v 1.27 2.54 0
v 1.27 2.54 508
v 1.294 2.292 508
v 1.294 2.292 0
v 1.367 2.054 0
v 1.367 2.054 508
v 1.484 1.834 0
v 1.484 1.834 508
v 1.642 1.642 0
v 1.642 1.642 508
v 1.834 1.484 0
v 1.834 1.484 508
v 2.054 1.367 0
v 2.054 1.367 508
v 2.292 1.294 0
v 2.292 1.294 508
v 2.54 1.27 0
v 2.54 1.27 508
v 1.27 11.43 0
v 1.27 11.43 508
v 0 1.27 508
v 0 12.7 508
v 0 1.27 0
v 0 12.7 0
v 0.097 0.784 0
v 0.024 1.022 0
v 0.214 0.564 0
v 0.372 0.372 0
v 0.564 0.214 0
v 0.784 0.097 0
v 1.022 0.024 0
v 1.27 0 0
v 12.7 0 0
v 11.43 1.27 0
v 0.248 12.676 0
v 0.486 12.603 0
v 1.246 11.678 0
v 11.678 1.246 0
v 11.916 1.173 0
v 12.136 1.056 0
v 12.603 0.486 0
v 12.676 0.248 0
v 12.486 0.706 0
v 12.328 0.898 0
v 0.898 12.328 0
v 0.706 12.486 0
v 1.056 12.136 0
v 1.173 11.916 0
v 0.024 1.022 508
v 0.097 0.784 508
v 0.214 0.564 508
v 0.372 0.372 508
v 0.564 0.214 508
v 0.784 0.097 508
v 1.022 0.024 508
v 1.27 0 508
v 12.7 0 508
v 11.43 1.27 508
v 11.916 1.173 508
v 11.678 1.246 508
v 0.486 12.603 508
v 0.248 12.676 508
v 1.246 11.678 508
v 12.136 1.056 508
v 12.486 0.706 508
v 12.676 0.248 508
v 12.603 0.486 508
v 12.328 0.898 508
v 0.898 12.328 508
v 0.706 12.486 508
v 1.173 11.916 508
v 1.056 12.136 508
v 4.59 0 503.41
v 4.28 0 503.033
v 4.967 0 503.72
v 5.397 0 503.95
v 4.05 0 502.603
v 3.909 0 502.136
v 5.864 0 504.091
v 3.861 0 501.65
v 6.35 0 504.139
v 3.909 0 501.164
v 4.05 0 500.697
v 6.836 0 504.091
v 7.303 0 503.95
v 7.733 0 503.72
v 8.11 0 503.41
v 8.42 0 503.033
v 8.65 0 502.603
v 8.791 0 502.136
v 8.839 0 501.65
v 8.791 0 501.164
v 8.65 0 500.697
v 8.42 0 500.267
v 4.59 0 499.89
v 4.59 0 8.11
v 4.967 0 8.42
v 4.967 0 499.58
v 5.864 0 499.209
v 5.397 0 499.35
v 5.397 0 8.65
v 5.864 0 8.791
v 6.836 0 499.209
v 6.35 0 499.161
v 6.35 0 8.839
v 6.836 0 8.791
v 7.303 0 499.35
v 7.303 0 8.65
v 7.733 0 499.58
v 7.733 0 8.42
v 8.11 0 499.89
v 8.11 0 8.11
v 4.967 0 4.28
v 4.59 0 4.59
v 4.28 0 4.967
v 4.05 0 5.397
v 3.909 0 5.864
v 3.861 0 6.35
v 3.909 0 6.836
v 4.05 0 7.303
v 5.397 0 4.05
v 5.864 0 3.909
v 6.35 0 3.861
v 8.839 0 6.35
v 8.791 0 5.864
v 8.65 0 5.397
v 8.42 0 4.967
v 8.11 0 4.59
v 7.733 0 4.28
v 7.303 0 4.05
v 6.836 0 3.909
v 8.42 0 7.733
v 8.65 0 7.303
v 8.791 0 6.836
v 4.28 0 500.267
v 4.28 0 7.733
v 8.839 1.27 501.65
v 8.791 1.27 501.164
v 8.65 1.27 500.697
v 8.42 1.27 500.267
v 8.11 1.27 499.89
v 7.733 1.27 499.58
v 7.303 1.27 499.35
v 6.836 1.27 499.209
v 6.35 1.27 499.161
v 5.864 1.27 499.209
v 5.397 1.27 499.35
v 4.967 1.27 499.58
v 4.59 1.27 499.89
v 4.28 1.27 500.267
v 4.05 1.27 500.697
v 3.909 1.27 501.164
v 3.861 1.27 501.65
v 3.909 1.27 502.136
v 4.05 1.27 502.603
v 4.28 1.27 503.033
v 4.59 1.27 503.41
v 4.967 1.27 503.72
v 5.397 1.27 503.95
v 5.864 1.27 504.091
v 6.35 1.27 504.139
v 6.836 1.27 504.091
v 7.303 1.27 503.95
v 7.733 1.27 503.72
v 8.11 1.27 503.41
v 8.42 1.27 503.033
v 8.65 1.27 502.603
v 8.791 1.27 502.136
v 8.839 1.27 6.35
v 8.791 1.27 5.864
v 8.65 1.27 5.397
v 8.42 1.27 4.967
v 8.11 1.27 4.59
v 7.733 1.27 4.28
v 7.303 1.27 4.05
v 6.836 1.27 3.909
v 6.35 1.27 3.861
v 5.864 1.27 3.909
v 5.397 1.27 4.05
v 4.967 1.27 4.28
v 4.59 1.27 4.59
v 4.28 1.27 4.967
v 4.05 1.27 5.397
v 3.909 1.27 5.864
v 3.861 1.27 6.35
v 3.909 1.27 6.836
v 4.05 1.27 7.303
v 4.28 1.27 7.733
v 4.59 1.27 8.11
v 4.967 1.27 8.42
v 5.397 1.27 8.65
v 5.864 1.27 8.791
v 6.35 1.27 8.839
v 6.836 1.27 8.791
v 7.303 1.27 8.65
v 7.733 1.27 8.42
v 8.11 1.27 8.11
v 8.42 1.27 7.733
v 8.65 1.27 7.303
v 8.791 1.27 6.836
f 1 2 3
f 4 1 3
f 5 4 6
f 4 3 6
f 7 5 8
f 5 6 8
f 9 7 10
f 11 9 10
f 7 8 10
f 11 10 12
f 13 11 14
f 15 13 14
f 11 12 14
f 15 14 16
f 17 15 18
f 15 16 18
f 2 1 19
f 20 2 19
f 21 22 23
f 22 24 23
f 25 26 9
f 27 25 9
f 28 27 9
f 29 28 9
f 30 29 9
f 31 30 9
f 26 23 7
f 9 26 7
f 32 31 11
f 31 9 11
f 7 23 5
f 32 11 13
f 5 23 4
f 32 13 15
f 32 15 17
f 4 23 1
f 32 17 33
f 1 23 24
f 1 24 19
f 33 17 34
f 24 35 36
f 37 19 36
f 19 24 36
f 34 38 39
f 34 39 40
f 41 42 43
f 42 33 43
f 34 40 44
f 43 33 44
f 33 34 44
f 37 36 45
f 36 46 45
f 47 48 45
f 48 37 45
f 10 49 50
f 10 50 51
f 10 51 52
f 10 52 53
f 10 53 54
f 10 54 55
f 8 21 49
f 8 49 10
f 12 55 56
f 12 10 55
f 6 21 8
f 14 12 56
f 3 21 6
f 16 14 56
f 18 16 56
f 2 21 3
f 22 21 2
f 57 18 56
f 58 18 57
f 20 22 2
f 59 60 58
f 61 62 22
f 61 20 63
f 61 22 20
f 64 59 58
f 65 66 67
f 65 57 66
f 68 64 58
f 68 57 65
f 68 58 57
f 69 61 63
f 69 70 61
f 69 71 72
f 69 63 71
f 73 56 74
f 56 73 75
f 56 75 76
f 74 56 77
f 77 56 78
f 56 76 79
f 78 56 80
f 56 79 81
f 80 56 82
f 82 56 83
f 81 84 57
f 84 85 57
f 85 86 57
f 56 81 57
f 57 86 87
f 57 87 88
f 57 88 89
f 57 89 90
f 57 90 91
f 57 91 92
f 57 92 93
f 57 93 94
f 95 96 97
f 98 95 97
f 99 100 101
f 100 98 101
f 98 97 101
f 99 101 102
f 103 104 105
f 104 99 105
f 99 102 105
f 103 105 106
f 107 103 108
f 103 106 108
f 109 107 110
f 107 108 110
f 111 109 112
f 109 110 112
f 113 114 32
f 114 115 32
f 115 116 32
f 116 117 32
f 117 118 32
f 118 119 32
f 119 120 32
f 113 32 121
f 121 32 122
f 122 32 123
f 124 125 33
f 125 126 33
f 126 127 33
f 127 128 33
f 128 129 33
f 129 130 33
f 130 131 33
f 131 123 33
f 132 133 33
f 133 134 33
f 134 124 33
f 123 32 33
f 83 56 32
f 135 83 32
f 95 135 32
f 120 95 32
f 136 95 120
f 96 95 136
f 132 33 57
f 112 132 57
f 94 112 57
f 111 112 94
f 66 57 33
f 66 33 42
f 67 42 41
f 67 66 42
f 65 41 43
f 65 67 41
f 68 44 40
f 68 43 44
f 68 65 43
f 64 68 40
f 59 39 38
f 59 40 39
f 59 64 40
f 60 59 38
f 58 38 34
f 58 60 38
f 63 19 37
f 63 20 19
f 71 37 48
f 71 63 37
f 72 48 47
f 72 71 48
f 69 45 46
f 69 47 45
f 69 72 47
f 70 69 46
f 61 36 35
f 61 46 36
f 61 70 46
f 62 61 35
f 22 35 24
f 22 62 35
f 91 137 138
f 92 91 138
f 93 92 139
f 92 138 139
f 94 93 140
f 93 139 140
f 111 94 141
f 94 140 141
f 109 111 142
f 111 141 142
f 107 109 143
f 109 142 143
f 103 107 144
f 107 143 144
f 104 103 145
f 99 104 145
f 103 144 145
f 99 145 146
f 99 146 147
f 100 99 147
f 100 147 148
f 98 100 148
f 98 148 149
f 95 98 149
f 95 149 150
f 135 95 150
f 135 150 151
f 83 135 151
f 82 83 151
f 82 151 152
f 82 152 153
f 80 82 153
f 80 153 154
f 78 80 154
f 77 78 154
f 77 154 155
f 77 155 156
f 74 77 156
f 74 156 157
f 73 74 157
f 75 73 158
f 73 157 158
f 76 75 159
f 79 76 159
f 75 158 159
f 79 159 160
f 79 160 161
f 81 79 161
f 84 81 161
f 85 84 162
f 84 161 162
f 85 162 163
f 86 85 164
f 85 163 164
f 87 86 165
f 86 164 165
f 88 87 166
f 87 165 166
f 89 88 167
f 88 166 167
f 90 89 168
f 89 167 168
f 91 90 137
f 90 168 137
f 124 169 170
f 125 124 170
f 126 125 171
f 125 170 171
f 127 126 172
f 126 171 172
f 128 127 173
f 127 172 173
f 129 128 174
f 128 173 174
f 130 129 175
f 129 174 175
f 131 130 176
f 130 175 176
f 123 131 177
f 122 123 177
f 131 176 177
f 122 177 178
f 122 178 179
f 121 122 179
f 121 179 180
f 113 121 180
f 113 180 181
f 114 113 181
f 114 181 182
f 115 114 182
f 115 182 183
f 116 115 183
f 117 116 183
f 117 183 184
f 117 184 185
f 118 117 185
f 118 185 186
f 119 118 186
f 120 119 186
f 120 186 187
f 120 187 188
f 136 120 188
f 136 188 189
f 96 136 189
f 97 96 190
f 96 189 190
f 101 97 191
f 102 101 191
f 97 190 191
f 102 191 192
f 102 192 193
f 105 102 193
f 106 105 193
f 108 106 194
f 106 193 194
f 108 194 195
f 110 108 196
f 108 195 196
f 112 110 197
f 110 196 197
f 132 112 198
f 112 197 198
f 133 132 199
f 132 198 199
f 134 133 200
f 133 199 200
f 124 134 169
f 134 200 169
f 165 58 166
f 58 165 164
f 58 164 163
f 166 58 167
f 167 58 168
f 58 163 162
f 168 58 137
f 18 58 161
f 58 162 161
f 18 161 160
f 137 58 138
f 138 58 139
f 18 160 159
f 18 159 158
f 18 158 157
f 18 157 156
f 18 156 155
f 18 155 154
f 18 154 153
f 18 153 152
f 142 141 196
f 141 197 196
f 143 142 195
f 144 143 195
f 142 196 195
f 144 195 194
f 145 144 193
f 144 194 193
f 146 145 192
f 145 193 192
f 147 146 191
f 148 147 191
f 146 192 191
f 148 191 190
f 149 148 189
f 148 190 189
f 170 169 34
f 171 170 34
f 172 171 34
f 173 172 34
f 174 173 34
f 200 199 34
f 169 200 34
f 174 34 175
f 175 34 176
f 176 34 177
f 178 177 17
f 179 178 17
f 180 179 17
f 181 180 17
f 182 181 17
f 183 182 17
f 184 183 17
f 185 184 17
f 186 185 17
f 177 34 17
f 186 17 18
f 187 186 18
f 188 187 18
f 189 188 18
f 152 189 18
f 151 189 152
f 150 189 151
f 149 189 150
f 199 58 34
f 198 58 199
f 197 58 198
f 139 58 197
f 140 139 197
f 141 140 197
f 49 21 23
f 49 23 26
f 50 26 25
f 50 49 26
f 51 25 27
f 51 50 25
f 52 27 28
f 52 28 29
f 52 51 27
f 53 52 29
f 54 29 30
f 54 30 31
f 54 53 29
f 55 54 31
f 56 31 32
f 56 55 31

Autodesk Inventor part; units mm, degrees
ref_plane "YZ Plane" through (0, 0, 0) normal (1, 0, 0) x (0, 1, 0)
ref_plane "XZ Plane" through (0, 0, 0) normal (0, 1, 0) x (-1, 0, 0)
ref_plane "XY Plane" through (0, 0, 0) normal (0, 0, 1) x (1, 0, 0)
sketch "Sketch1" plane through (0, 0, 0) normal (0, 0, 1) x (1, 0, 0)
  line L0 (0, 0) -> (12.7, 0)
  line L1 (12.7, 0) -> (12.7, 1.27)
  line L2 (12.7, 1.27) -> (1.27, 1.27)
  line L3 (1.27, 1.27) -> (1.27, 12.7)
  line L4 (1.27, 12.7) -> (0, 12.7)
  line L5 (0, 12.7) -> (0, 0)
  dimension "d0" = 12.7
  dimension "d1" = 1.27
  dimension "d2" = 11.43
extrude "Extrusion1" add sketch "Sketch1" along normal blind 508
fillet "Fillet1" radius 1.27 4 edges at (12.7, 1.27, 254) (1.27, 12.7, 254) (1.27, 1.27, 254) (0, 0, 254)
sketch "Sketch2" plane through (2.54, 1.27, 508) normal (0, 1, 0) x (1, 0, 0)
  line L0 (0, 0) -> (0, 508) projected
  line L1 (8.89, 0) -> (0, 0) projected
  line L2 (8.89, 508) -> (8.89, 0) projected
  circle A0 centre (3.81, 6.35) radius 2.4892
  line L3 (-2.54, 0) -> (-2.54, 508) projected
  line L4 (-2.54, 508) -> (-2.54, 0) projected
  line L5 (8.89, 254) -> (0, 254) construction
  circle A1 centre (3.81, 501.65) radius 2.4892
  dimension "d6" = 4.9784
  dimension "d7" = 6.35
  dimension "d8" = 6.35
extrude "Extrusion2" cut sketch "Sketch2" against normal blind 25.4
properties part number ".05 in Aluminum Angle" material "Aluminum 6061"
